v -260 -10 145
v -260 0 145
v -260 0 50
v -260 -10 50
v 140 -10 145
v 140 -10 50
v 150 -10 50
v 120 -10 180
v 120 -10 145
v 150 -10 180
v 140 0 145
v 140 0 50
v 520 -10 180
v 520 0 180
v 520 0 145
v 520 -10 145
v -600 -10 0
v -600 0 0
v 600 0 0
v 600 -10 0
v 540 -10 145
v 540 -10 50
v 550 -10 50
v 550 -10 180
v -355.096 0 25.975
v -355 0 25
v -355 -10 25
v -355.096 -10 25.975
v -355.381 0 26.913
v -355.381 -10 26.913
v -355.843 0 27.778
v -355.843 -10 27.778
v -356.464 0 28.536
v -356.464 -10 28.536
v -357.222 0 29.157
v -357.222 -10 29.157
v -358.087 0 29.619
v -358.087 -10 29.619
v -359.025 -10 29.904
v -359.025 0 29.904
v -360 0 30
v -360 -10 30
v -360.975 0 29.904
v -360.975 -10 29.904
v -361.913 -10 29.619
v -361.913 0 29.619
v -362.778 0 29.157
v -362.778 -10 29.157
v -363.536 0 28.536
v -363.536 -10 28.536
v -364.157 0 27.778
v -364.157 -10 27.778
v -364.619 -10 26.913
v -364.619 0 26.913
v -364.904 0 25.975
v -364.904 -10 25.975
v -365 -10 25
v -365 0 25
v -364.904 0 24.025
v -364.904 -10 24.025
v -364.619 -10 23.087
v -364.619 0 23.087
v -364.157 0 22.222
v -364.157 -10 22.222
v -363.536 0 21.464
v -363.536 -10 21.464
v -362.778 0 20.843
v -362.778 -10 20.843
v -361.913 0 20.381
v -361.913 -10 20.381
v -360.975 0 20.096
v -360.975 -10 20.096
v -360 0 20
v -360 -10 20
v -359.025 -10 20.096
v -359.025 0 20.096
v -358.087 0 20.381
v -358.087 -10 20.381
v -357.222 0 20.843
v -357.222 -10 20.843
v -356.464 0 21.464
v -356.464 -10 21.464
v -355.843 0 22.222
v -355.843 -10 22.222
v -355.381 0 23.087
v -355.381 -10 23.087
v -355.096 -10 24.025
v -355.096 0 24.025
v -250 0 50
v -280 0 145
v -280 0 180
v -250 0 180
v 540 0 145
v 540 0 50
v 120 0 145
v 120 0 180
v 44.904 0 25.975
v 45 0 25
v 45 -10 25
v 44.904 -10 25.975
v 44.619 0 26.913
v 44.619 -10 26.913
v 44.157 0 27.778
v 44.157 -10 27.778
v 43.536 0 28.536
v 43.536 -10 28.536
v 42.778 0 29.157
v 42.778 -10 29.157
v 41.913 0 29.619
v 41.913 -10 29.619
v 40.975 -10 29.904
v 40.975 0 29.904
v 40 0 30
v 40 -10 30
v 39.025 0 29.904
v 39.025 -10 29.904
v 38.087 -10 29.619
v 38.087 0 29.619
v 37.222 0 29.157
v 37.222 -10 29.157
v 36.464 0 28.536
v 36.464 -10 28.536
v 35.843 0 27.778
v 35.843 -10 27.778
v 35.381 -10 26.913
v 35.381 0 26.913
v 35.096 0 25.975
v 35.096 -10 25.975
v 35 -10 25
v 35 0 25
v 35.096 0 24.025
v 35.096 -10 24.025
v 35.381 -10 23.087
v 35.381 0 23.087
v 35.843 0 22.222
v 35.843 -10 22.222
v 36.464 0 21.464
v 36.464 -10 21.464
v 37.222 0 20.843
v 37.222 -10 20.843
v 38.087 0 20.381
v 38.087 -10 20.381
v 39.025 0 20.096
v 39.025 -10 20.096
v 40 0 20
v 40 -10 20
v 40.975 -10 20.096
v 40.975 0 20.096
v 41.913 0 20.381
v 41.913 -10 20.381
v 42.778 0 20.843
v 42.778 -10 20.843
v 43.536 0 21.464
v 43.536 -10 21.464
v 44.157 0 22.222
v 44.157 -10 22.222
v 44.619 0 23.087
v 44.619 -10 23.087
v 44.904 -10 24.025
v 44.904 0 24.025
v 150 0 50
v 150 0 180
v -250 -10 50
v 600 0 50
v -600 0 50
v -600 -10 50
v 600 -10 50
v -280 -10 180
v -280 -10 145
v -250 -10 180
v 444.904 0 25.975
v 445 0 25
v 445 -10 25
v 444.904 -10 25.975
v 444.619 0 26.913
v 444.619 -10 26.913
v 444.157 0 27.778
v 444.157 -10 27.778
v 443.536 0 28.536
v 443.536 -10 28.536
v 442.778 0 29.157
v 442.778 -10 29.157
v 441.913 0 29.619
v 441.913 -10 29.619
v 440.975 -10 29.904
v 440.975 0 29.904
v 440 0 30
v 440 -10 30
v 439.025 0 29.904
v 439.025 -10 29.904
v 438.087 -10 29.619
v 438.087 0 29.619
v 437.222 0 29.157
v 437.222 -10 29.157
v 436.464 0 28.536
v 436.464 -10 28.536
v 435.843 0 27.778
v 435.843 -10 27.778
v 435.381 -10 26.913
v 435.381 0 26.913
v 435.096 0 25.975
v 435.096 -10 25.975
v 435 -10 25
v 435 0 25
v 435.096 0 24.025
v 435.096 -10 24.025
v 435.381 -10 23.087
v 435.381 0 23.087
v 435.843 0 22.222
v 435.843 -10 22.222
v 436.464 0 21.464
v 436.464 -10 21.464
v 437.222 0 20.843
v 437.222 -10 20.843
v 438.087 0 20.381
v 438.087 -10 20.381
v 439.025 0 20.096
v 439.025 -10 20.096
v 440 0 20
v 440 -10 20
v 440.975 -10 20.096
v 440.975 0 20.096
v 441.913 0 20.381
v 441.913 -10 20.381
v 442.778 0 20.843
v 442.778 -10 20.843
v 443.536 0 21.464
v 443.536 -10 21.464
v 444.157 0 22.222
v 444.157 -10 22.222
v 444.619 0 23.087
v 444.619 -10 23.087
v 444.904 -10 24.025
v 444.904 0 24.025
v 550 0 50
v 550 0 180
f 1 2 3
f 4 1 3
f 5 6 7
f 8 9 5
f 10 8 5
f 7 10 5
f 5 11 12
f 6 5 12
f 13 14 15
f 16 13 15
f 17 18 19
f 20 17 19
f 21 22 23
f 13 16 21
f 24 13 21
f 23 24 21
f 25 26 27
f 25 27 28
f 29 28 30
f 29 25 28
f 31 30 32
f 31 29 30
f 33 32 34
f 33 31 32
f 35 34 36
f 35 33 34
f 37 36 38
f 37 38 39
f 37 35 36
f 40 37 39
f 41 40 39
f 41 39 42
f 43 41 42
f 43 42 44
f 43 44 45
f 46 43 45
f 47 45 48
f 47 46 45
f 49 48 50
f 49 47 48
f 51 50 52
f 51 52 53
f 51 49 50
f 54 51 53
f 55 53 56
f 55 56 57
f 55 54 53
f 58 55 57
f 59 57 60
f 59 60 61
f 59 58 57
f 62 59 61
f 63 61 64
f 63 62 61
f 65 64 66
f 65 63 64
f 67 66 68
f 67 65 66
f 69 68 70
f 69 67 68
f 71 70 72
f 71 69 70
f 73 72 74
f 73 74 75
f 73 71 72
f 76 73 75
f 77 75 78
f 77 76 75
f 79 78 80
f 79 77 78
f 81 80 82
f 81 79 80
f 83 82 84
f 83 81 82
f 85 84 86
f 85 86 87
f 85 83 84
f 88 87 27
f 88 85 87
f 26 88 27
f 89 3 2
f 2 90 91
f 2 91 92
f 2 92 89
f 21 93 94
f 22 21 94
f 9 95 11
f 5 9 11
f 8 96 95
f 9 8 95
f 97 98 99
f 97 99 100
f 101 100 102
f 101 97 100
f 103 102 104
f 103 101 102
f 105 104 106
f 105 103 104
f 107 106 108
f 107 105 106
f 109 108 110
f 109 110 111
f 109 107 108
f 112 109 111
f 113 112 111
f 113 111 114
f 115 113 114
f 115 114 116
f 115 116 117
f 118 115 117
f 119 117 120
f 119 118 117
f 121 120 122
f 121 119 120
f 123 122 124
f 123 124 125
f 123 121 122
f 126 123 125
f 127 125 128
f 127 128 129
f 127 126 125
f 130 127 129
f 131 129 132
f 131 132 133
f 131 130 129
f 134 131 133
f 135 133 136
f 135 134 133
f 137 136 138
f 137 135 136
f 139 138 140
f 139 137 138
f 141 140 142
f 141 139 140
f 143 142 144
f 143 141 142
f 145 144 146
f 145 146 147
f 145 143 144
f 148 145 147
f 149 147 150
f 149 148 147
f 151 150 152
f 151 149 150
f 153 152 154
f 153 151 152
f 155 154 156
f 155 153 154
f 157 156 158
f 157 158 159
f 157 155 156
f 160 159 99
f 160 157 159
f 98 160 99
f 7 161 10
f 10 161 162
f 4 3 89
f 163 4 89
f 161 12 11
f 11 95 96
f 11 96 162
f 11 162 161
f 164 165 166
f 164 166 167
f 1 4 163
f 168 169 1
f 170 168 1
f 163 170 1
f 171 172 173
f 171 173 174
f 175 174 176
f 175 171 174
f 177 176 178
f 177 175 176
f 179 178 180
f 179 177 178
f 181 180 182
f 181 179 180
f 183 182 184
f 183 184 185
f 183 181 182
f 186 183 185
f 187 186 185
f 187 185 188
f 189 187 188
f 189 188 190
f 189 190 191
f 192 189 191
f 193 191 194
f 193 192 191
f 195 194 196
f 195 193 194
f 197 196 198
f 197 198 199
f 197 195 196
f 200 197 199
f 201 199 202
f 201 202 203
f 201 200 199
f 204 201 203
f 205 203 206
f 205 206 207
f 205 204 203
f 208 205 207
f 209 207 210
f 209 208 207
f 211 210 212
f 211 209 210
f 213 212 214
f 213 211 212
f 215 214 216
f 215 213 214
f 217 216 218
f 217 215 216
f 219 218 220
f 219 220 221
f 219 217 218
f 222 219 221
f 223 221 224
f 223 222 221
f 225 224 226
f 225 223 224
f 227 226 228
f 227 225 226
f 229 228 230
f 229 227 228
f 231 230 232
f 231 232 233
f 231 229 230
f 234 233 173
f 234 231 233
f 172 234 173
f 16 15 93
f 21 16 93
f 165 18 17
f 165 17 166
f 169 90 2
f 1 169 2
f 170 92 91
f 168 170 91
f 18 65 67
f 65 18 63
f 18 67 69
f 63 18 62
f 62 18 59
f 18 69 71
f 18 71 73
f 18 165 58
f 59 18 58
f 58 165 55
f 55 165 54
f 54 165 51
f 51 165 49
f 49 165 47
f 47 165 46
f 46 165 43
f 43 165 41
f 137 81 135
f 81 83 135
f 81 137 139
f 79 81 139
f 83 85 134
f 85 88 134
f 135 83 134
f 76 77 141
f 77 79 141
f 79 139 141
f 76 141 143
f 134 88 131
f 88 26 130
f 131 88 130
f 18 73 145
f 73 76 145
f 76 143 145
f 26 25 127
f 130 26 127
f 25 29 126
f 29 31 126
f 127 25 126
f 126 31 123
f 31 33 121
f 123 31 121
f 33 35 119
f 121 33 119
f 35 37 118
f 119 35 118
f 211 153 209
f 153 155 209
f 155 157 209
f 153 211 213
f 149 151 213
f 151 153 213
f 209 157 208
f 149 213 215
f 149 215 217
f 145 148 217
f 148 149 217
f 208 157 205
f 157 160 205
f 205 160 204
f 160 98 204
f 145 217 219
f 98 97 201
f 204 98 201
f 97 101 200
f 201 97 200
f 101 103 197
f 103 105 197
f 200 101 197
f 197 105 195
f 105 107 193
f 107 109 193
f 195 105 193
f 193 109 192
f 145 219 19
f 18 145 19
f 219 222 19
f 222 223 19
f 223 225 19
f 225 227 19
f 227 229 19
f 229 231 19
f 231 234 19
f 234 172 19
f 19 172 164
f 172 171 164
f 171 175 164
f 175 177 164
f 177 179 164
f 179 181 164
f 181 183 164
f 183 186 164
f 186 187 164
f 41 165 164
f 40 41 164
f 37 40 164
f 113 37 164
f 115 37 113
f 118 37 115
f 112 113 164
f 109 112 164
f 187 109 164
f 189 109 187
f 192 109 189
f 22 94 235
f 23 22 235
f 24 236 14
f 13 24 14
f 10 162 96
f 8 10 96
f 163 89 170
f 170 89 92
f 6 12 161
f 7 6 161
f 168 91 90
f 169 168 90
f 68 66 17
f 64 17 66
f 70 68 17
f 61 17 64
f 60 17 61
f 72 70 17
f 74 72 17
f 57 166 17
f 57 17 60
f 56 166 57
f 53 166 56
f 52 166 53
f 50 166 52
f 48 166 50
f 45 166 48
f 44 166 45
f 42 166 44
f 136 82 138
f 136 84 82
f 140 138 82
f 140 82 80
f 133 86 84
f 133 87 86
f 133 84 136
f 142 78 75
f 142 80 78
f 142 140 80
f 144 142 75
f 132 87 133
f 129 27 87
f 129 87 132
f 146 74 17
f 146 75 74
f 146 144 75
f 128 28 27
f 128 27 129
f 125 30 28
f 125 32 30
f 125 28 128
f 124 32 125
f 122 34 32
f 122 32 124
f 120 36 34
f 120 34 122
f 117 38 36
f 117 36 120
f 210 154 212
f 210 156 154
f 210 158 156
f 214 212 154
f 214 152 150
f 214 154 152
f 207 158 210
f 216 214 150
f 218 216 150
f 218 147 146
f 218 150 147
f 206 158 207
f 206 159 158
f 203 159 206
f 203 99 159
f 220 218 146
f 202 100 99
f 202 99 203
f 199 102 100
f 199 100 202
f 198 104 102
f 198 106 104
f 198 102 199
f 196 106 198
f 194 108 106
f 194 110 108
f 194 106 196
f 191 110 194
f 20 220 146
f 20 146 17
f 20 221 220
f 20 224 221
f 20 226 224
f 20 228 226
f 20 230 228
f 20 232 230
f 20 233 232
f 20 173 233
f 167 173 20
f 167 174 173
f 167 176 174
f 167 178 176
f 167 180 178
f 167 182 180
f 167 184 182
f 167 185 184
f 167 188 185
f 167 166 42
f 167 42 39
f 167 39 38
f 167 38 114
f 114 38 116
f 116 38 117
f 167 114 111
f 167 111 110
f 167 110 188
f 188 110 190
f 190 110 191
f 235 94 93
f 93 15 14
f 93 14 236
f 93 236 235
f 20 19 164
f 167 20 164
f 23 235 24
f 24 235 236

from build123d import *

# Parameters (mm, degrees)
F0_W     = 1200
F0_H     = 50
F2_DEPTH = 10
F3_R     = 5
F4_DEPTH = 10


with BuildPart() as f2:
    # F0 (on Front) → F2 (new body)
    with BuildSketch(Plane.XZ):
        with Locations((0, 25)):
            Rectangle(F0_W, F0_H)
    extrude(amount=F2_DEPTH)

    # F3 (on Front) → F4 (cut, through all)
    with BuildSketch(Plane.XZ):
        with Locations((440, 25)):
            Circle(F3_R)
        with Locations((40, 25)):
            Circle(F3_R)
        with Locations((-360, 25)):
            Circle(F3_R)
    extrude(amount=F4_DEPTH, mode=Mode.SUBTRACT)


with BuildPart() as f2b:
    # F1 (on Front) → F2, piece 2 (new body)
    with BuildSketch(Plane.XZ):
        Polygon((540, 50), (550, 50), (550, 180), (520, 180), (520, 145), (540, 145), align=None)
    extrude(amount=F2_DEPTH)


with BuildPart() as f2c:
    # F1 (on Front) → F2, piece 3 (new body)
    with BuildSketch(Plane.XZ):
        Polygon((150, 50), (150, 180), (120, 180), (120, 145), (140, 145), (140, 50), align=None)
    extrude(amount=F2_DEPTH)


with BuildPart() as f2d:
    # F1 (on Front) → F2, piece 4 (new body)
    with BuildSketch(Plane.XZ):
        Polygon((-250, 50), (-250, 180), (-280, 180), (-280, 145), (-260, 145), (-260, 50), align=None)
    extrude(amount=F2_DEPTH)


solid = Compound([f2.part, f2b.part, f2c.part, f2d.part])
